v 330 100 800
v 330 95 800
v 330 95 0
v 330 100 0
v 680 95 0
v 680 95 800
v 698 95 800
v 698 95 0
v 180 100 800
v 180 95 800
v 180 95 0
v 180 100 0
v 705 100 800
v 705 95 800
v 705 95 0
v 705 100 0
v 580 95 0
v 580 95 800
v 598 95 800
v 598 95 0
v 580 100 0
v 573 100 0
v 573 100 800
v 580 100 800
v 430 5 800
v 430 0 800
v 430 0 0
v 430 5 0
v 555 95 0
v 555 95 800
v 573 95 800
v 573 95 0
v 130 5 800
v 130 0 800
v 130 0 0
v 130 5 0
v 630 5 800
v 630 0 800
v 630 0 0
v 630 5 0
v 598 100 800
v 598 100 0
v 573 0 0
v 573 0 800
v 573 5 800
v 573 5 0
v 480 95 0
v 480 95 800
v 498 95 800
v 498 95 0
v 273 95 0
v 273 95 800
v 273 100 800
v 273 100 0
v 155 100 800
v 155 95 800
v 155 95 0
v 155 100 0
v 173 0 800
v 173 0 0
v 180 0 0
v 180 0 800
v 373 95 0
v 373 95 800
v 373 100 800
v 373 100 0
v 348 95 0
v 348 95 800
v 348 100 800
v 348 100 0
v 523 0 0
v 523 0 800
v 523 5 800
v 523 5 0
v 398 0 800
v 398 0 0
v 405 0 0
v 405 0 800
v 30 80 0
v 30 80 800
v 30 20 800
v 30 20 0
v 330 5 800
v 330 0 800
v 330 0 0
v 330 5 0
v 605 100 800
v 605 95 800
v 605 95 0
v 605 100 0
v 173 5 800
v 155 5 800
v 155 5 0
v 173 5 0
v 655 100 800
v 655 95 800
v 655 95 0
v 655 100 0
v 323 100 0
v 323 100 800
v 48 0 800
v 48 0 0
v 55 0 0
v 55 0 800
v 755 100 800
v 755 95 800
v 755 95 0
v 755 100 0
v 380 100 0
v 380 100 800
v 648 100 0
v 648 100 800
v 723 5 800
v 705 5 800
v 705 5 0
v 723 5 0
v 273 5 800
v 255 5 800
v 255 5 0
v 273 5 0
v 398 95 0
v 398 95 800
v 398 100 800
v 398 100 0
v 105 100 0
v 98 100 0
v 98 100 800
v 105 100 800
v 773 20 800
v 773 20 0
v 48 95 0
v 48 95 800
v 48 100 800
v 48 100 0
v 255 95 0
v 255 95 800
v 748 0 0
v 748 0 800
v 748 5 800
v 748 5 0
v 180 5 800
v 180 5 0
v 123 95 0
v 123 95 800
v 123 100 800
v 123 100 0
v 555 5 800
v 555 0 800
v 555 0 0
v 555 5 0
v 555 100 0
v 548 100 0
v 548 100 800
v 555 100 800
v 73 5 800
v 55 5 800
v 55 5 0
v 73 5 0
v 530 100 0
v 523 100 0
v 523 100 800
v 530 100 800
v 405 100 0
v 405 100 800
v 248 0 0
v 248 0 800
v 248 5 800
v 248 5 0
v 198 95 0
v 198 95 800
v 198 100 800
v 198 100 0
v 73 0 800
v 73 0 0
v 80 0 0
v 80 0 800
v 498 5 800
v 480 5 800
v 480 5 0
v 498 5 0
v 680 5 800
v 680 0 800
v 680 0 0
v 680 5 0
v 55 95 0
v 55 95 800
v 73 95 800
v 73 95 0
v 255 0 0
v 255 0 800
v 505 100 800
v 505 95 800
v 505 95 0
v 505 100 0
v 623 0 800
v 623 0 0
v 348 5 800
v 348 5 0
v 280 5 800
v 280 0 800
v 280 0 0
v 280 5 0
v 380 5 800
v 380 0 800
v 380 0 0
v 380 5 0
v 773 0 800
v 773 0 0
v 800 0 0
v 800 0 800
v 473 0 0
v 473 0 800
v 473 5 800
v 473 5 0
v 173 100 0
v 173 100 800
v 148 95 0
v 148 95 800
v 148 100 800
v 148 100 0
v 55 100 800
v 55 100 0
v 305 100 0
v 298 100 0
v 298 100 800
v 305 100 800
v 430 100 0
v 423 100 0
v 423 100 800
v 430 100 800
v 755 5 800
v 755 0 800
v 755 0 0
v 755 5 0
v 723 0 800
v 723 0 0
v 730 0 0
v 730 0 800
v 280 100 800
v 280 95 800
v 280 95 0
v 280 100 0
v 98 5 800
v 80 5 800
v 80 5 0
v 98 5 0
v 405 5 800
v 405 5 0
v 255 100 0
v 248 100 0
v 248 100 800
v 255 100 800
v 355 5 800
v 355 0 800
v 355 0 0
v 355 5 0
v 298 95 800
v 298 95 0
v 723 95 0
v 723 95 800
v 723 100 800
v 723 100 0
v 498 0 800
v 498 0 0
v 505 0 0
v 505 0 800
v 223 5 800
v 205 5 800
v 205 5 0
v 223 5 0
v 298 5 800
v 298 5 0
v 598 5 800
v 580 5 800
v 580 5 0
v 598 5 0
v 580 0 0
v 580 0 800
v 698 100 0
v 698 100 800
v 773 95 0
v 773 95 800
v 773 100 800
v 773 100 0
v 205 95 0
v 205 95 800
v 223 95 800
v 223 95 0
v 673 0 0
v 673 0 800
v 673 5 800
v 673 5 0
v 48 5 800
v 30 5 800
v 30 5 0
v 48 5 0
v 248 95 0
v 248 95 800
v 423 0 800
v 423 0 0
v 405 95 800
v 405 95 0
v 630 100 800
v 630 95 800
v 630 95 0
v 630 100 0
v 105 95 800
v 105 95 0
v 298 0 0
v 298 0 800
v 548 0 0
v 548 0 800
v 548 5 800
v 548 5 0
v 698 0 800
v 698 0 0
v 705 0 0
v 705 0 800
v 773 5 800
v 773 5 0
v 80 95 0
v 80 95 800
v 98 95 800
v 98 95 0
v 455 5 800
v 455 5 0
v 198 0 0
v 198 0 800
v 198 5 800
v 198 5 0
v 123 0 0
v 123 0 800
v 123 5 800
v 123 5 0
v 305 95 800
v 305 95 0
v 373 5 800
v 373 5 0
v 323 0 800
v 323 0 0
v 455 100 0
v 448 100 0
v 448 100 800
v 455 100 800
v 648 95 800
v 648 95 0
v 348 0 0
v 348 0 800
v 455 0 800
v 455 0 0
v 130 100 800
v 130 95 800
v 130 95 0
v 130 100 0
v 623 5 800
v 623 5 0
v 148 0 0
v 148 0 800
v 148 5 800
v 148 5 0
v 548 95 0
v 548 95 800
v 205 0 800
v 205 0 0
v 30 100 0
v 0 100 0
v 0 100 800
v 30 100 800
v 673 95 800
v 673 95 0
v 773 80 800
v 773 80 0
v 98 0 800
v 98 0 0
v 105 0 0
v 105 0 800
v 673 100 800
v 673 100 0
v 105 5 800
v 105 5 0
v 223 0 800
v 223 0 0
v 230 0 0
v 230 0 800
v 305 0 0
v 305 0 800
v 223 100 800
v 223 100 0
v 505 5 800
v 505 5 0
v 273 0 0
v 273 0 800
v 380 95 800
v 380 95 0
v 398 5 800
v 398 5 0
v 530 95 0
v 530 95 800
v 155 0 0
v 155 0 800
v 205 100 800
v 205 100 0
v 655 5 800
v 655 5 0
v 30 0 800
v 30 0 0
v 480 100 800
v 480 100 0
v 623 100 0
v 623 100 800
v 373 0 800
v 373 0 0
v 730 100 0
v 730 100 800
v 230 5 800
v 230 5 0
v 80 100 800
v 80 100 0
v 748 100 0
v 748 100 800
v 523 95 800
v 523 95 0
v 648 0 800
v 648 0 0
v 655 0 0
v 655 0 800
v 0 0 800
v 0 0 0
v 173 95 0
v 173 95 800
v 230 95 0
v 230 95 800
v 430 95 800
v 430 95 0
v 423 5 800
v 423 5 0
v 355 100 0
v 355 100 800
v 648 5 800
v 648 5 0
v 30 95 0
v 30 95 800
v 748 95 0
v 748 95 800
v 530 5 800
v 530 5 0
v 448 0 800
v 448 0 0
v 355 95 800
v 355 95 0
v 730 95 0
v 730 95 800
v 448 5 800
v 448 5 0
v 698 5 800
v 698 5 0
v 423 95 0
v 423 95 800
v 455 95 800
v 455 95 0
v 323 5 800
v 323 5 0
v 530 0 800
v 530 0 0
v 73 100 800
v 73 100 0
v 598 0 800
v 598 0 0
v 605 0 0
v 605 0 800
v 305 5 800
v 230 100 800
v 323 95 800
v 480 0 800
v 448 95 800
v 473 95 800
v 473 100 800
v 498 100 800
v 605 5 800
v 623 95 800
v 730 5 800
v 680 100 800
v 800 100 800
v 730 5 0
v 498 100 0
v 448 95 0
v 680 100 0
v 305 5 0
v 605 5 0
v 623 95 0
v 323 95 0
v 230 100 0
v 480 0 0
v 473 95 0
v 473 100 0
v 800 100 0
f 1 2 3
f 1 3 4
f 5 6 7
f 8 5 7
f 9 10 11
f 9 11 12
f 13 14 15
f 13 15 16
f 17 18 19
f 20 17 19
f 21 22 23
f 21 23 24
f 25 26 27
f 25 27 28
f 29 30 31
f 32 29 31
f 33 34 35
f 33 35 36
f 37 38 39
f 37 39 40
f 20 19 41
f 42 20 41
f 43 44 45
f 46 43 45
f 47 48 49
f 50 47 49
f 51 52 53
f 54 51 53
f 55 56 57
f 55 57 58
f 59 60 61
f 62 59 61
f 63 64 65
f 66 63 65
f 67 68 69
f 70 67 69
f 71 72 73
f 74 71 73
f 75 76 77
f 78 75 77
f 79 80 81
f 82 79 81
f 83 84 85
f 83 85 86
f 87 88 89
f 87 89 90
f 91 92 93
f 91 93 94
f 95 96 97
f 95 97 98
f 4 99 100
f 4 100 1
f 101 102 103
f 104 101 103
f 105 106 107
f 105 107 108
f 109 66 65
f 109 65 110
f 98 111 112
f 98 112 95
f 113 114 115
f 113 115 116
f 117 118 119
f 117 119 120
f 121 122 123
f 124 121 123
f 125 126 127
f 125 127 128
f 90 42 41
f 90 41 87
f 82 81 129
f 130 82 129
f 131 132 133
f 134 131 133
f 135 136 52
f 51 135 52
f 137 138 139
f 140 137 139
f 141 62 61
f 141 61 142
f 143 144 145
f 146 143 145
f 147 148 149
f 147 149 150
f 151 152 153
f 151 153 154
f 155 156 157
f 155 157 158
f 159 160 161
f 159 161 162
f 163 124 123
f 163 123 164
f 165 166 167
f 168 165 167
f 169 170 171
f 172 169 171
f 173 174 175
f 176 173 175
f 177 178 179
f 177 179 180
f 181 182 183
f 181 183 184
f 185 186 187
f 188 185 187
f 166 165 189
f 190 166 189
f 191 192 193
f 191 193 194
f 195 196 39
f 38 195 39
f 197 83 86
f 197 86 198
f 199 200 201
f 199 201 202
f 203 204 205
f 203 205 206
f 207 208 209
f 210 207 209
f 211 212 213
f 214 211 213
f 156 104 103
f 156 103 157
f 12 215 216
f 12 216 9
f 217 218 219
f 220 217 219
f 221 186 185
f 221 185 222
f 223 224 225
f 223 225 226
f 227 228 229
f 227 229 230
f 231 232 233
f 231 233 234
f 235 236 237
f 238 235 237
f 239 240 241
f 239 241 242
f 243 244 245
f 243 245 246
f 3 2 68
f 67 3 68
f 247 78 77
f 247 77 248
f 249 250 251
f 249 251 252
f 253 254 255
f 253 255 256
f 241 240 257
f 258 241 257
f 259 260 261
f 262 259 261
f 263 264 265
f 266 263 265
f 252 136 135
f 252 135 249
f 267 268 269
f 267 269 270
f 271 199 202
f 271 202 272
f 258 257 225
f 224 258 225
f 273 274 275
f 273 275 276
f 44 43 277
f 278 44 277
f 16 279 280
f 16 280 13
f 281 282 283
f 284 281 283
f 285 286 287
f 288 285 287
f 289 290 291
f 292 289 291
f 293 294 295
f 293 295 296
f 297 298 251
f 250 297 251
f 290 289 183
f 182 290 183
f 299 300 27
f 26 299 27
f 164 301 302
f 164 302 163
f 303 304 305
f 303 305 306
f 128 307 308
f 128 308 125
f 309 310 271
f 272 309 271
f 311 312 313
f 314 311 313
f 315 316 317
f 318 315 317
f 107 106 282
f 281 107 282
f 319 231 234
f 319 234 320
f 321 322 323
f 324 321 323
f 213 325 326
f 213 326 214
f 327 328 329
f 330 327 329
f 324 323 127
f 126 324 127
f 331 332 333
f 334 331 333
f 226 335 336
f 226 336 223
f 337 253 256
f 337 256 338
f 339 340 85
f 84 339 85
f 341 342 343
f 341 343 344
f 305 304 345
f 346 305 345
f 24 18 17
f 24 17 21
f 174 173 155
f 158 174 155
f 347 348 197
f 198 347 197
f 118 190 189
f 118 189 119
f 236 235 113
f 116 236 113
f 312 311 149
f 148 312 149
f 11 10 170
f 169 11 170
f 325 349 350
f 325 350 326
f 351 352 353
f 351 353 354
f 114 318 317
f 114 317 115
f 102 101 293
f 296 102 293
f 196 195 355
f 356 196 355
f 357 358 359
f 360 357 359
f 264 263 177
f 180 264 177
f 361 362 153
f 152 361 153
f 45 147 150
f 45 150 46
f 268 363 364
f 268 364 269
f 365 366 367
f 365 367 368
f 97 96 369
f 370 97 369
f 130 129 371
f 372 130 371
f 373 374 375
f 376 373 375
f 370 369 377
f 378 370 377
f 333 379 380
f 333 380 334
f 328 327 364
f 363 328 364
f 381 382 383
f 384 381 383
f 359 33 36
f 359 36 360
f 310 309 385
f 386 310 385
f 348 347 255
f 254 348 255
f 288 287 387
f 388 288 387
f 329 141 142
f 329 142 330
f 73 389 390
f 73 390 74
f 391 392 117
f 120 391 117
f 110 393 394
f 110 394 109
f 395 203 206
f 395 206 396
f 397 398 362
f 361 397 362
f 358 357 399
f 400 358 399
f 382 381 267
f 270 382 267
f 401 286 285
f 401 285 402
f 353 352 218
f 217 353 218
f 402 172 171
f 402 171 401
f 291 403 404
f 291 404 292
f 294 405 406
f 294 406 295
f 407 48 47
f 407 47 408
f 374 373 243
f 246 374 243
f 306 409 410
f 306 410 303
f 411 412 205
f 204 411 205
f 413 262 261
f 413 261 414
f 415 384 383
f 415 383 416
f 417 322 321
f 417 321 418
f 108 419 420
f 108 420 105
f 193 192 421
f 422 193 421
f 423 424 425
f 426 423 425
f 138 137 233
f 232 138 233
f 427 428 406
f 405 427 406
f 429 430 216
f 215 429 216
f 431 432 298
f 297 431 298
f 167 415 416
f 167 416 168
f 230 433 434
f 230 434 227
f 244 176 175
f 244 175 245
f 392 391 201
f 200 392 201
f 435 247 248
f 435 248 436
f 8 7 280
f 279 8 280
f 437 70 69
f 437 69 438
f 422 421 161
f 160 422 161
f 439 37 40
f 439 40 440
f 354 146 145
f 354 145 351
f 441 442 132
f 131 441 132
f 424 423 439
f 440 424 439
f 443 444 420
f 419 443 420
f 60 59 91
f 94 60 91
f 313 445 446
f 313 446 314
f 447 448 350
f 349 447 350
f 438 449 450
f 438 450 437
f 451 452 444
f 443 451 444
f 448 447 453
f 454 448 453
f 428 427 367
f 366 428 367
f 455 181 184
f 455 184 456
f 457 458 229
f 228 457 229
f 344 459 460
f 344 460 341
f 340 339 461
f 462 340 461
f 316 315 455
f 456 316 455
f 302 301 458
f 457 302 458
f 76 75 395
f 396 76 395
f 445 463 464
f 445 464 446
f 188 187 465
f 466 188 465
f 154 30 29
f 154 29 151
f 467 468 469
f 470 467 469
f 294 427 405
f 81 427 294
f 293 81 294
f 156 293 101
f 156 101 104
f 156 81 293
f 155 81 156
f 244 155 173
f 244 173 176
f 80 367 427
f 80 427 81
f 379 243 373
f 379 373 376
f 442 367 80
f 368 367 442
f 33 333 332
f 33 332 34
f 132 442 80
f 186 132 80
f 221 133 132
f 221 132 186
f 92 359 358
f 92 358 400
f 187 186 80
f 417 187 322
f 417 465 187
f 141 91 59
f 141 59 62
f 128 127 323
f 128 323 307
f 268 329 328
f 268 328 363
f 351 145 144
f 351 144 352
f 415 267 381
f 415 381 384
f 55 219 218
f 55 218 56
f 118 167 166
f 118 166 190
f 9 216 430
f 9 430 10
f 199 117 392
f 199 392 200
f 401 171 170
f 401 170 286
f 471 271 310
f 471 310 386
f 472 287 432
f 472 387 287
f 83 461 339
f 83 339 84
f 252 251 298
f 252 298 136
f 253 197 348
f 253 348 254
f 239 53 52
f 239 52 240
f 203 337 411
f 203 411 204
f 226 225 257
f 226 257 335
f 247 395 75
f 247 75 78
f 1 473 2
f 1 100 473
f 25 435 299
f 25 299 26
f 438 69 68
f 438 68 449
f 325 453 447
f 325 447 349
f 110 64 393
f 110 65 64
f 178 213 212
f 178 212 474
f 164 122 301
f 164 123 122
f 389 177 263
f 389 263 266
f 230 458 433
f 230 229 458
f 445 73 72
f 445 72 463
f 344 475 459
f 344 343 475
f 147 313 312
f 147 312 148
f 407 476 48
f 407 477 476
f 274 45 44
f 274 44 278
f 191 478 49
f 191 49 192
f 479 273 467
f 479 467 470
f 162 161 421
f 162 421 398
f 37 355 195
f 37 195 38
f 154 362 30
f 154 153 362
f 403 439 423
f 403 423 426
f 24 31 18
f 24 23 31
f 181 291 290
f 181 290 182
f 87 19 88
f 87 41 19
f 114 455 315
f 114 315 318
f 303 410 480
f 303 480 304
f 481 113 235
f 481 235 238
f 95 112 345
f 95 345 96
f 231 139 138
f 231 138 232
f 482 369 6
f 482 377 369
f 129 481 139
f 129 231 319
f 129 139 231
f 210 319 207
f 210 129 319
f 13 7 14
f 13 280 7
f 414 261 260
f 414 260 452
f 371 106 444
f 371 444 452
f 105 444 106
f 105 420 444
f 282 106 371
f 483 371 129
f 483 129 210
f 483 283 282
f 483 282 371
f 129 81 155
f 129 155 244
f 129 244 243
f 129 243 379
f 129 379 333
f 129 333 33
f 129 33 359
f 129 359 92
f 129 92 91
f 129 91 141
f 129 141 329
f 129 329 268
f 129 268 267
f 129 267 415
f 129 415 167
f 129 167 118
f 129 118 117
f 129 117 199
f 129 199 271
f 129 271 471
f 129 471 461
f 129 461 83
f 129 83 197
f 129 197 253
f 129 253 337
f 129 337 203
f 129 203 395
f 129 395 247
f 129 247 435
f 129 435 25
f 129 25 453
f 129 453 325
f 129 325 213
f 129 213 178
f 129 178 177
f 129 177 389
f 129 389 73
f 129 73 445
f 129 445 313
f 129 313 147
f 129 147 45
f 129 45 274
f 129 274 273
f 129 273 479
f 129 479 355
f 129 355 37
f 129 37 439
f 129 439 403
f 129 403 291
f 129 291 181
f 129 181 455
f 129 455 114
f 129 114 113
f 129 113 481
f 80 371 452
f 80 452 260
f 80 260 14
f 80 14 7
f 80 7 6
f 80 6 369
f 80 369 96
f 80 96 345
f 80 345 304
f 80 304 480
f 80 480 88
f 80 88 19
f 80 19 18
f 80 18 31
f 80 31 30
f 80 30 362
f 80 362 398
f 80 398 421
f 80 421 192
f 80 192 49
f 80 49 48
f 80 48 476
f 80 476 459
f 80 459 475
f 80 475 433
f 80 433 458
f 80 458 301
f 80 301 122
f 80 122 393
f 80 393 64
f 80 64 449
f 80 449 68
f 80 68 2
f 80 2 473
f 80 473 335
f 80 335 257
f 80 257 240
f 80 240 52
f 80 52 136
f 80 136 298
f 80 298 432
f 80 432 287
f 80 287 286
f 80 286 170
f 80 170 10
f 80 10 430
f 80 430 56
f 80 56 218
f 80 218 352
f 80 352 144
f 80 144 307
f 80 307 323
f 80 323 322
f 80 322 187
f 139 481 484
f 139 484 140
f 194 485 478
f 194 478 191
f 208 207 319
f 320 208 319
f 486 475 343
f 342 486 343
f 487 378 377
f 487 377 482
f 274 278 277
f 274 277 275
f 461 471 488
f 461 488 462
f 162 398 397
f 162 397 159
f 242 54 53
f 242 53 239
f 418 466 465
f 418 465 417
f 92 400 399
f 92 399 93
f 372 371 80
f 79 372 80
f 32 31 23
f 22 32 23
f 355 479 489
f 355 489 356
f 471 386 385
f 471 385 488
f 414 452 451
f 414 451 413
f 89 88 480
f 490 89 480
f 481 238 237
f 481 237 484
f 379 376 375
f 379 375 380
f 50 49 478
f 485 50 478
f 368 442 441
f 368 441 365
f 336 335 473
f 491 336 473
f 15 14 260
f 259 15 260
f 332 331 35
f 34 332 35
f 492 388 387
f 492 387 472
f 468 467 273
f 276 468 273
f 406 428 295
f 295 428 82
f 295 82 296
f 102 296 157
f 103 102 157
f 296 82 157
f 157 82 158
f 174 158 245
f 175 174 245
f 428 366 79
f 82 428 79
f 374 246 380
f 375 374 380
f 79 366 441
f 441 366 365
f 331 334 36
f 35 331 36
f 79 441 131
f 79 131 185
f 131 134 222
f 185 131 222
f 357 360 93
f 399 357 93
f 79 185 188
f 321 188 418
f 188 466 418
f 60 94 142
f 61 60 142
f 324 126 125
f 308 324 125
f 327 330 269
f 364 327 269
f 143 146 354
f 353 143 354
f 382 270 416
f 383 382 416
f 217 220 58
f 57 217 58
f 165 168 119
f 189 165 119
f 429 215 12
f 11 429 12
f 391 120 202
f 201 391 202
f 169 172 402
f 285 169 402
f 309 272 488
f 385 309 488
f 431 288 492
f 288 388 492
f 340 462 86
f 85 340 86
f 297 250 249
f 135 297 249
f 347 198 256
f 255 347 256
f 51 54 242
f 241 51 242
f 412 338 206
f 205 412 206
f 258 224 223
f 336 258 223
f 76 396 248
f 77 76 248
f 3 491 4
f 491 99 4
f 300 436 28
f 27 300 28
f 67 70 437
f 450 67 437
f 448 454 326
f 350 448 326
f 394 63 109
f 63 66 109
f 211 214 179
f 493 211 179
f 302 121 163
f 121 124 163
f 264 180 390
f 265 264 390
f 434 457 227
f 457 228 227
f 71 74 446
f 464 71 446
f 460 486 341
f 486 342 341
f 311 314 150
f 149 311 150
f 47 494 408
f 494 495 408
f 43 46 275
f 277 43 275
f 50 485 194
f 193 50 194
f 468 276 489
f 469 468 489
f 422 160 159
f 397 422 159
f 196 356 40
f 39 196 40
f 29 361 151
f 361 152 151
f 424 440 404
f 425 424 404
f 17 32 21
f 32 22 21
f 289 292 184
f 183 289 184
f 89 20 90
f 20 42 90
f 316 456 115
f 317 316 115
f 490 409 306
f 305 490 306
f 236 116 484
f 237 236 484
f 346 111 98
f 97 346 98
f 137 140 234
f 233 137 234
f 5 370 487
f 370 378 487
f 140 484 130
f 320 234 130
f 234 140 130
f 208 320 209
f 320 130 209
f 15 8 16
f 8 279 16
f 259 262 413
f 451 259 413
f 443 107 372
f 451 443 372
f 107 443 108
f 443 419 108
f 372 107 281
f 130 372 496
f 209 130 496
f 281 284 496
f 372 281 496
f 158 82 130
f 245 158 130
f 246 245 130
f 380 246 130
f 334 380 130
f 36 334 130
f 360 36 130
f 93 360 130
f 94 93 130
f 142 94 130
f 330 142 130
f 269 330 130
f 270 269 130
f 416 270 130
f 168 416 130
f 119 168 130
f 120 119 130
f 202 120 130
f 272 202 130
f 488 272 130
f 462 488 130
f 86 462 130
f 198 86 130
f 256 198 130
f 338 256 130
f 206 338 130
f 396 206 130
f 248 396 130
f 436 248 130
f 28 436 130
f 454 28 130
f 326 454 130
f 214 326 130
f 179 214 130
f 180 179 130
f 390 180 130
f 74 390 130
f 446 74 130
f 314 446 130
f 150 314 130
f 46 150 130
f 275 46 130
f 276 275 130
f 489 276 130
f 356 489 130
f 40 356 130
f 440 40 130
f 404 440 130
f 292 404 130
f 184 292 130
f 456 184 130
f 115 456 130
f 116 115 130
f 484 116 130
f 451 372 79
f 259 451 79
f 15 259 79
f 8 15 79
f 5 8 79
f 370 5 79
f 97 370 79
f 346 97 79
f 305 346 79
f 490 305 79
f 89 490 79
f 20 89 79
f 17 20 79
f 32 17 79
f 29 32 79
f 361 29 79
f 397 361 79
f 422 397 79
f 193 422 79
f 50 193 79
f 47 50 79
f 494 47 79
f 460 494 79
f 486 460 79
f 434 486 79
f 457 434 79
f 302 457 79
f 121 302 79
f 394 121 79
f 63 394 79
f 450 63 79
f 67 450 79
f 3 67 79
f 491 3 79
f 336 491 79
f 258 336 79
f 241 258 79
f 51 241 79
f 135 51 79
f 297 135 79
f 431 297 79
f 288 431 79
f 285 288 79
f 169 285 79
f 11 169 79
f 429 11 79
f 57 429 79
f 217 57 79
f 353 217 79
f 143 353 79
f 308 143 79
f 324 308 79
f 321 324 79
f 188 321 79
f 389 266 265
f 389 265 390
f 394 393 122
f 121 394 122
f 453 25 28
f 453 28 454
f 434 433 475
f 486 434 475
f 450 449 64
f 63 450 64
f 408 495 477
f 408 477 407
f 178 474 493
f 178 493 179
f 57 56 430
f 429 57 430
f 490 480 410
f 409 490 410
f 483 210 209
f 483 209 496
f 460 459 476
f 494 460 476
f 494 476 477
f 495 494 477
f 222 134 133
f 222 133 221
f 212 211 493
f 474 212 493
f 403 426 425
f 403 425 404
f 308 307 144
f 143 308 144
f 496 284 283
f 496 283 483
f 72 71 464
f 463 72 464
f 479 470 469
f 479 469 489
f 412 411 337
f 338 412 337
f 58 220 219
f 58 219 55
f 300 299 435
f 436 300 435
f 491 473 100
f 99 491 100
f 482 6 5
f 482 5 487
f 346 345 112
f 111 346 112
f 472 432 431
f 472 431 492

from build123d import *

# Parameters (mm, degrees)
F0_W     = 800
F0_H     = 100
F1_DEPTH = 800
F2_W     = 18
F2_H     = 5
F3_DEPTH = 800


with BuildPart() as f1:
    # F0 (on Top) → F1 (new body)
    with BuildSketch(Plane.XY):
        with Locations((400, 50)):
            Rectangle(F0_W, F0_H)
    extrude(amount=F1_DEPTH)

    # F2 (on face) → F3 (cut, through all)
    with BuildSketch(Plane.XY.offset(800)):
        Polygon((30, 50), (30, 20), (773, 20), (773, 50), (773, 80), (30, 80), align=None)
        with Locations((39, 2.5)):
            Rectangle(F2_W, F2_H)
        with Locations((64, 2.5)):
            Rectangle(F2_W, F2_H)
        with Locations((89, 2.5)):
            Rectangle(F2_W, F2_H)
        with Locations((114, 2.5)):
            Rectangle(F2_W, F2_H)
        with Locations((139, 2.5)):
            Rectangle(F2_W, F2_H)
        with Locations((339, 97.5)):
            Rectangle(F2_W, F2_H)
        with Locations((289, 2.5)):
            Rectangle(F2_W, F2_H)
        with Locations((264, 2.5)):
            Rectangle(F2_W, F2_H)
        with Locations((239, 2.5)):
            Rectangle(F2_W, F2_H)
        with Locations((689, 97.5)):
            Rectangle(F2_W, F2_H)
        with Locations((364, 97.5)):
            Rectangle(F2_W, F2_H)
        with Locations((639, 2.5)):
            Rectangle(F2_W, F2_H)
        with Locations((614, 2.5)):
            Rectangle(F2_W, F2_H)
        with Locations((589, 2.5)):
            Rectangle(F2_W, F2_H)
        with Locations((314, 97.5)):
            Rectangle(F2_W, F2_H)
        with Locations((664, 97.5)):
            Rectangle(F2_W, F2_H)
        with Locations((539, 2.5)):
            Rectangle(F2_W, F2_H)
        with Locations((514, 97.5)):
            Rectangle(F2_W, F2_H)
        with Locations((314, 2.5)):
            Rectangle(F2_W, F2_H)
        with Locations((214, 2.5)):
            Rectangle(F2_W, F2_H)
        with Locations((189, 2.5)):
            Rectangle(F2_W, F2_H)
        with Locations((164, 2.5)):
            Rectangle(F2_W, F2_H)
        with Locations((364, 2.5)):
            Rectangle(F2_W, F2_H)
        with Locations((339, 2.5)):
            Rectangle(F2_W, F2_H)
        with Locations((389, 2.5)):
            Rectangle(F2_W, F2_H)
        with Locations((714, 2.5)):
            Rectangle(F2_W, F2_H)
        with Locations((614, 97.5)):
            Rectangle(F2_W, F2_H)
        with Locations((514, 2.5)):
            Rectangle(F2_W, F2_H)
        with Locations((214, 97.5)):
            Rectangle(F2_W, F2_H)
        with Locations((114, 97.5)):
            Rectangle(F2_W, F2_H)
        with Locations((489, 2.5)):
            Rectangle(F2_W, F2_H)
        with Locations((89, 97.5)):
            Rectangle(F2_W, F2_H)
        with Locations((714, 97.5)):
            Rectangle(F2_W, F2_H)
        with Locations((464, 2.5)):
            Rectangle(F2_W, F2_H)
        with Locations((189, 97.5)):
            Rectangle(F2_W, F2_H)
        with Locations((689, 2.5)):
            Rectangle(F2_W, F2_H)
        with Locations((439, 97.5)):
            Rectangle(F2_W, F2_H)
        with Locations((289, 97.5)):
            Rectangle(F2_W, F2_H)
        with Locations((439, 2.5)):
            Rectangle(F2_W, F2_H)
        with Locations((264, 97.5)):
            Rectangle(F2_W, F2_H)
        with Locations((389, 97.5)):
            Rectangle(F2_W, F2_H)
        with Locations((664, 2.5)):
            Rectangle(F2_W, F2_H)
        with Locations((464, 97.5)):
            Rectangle(F2_W, F2_H)
        with Locations((414, 2.5)):
            Rectangle(F2_W, F2_H)
        with Locations((539, 97.5)):
            Rectangle(F2_W, F2_H)
        with Locations((564, 97.5)):
            Rectangle(F2_W, F2_H)
        with Locations((639, 97.5)):
            Rectangle(F2_W, F2_H)
        with Locations((164, 97.5)):
            Rectangle(F2_W, F2_H)
        with Locations((139, 97.5)):
            Rectangle(F2_W, F2_H)
        with Locations((39, 97.5)):
            Rectangle(F2_W, F2_H)
        with Locations((564, 2.5)):
            Rectangle(F2_W, F2_H)
        with Locations((239, 97.5)):
            Rectangle(F2_W, F2_H)
        with Locations((414, 97.5)):
            Rectangle(F2_W, F2_H)
        with Locations((589, 97.5)):
            Rectangle(F2_W, F2_H)
        with Locations((764, 2.5)):
            Rectangle(F2_W, F2_H)
        with Locations((64, 97.5)):
            Rectangle(F2_W, F2_H)
        with Locations((739, 2.5)):
            Rectangle(F2_W, F2_H)
        with Locations((489, 97.5)):
            Rectangle(F2_W, F2_H)
        with Locations((739, 97.5)):
            Rectangle(F2_W, F2_H)
        with Locations((764, 97.5)):
            Rectangle(F2_W, F2_H)
    extrude(amount=-F3_DEPTH, mode=Mode.SUBTRACT)


solid = f1.part
